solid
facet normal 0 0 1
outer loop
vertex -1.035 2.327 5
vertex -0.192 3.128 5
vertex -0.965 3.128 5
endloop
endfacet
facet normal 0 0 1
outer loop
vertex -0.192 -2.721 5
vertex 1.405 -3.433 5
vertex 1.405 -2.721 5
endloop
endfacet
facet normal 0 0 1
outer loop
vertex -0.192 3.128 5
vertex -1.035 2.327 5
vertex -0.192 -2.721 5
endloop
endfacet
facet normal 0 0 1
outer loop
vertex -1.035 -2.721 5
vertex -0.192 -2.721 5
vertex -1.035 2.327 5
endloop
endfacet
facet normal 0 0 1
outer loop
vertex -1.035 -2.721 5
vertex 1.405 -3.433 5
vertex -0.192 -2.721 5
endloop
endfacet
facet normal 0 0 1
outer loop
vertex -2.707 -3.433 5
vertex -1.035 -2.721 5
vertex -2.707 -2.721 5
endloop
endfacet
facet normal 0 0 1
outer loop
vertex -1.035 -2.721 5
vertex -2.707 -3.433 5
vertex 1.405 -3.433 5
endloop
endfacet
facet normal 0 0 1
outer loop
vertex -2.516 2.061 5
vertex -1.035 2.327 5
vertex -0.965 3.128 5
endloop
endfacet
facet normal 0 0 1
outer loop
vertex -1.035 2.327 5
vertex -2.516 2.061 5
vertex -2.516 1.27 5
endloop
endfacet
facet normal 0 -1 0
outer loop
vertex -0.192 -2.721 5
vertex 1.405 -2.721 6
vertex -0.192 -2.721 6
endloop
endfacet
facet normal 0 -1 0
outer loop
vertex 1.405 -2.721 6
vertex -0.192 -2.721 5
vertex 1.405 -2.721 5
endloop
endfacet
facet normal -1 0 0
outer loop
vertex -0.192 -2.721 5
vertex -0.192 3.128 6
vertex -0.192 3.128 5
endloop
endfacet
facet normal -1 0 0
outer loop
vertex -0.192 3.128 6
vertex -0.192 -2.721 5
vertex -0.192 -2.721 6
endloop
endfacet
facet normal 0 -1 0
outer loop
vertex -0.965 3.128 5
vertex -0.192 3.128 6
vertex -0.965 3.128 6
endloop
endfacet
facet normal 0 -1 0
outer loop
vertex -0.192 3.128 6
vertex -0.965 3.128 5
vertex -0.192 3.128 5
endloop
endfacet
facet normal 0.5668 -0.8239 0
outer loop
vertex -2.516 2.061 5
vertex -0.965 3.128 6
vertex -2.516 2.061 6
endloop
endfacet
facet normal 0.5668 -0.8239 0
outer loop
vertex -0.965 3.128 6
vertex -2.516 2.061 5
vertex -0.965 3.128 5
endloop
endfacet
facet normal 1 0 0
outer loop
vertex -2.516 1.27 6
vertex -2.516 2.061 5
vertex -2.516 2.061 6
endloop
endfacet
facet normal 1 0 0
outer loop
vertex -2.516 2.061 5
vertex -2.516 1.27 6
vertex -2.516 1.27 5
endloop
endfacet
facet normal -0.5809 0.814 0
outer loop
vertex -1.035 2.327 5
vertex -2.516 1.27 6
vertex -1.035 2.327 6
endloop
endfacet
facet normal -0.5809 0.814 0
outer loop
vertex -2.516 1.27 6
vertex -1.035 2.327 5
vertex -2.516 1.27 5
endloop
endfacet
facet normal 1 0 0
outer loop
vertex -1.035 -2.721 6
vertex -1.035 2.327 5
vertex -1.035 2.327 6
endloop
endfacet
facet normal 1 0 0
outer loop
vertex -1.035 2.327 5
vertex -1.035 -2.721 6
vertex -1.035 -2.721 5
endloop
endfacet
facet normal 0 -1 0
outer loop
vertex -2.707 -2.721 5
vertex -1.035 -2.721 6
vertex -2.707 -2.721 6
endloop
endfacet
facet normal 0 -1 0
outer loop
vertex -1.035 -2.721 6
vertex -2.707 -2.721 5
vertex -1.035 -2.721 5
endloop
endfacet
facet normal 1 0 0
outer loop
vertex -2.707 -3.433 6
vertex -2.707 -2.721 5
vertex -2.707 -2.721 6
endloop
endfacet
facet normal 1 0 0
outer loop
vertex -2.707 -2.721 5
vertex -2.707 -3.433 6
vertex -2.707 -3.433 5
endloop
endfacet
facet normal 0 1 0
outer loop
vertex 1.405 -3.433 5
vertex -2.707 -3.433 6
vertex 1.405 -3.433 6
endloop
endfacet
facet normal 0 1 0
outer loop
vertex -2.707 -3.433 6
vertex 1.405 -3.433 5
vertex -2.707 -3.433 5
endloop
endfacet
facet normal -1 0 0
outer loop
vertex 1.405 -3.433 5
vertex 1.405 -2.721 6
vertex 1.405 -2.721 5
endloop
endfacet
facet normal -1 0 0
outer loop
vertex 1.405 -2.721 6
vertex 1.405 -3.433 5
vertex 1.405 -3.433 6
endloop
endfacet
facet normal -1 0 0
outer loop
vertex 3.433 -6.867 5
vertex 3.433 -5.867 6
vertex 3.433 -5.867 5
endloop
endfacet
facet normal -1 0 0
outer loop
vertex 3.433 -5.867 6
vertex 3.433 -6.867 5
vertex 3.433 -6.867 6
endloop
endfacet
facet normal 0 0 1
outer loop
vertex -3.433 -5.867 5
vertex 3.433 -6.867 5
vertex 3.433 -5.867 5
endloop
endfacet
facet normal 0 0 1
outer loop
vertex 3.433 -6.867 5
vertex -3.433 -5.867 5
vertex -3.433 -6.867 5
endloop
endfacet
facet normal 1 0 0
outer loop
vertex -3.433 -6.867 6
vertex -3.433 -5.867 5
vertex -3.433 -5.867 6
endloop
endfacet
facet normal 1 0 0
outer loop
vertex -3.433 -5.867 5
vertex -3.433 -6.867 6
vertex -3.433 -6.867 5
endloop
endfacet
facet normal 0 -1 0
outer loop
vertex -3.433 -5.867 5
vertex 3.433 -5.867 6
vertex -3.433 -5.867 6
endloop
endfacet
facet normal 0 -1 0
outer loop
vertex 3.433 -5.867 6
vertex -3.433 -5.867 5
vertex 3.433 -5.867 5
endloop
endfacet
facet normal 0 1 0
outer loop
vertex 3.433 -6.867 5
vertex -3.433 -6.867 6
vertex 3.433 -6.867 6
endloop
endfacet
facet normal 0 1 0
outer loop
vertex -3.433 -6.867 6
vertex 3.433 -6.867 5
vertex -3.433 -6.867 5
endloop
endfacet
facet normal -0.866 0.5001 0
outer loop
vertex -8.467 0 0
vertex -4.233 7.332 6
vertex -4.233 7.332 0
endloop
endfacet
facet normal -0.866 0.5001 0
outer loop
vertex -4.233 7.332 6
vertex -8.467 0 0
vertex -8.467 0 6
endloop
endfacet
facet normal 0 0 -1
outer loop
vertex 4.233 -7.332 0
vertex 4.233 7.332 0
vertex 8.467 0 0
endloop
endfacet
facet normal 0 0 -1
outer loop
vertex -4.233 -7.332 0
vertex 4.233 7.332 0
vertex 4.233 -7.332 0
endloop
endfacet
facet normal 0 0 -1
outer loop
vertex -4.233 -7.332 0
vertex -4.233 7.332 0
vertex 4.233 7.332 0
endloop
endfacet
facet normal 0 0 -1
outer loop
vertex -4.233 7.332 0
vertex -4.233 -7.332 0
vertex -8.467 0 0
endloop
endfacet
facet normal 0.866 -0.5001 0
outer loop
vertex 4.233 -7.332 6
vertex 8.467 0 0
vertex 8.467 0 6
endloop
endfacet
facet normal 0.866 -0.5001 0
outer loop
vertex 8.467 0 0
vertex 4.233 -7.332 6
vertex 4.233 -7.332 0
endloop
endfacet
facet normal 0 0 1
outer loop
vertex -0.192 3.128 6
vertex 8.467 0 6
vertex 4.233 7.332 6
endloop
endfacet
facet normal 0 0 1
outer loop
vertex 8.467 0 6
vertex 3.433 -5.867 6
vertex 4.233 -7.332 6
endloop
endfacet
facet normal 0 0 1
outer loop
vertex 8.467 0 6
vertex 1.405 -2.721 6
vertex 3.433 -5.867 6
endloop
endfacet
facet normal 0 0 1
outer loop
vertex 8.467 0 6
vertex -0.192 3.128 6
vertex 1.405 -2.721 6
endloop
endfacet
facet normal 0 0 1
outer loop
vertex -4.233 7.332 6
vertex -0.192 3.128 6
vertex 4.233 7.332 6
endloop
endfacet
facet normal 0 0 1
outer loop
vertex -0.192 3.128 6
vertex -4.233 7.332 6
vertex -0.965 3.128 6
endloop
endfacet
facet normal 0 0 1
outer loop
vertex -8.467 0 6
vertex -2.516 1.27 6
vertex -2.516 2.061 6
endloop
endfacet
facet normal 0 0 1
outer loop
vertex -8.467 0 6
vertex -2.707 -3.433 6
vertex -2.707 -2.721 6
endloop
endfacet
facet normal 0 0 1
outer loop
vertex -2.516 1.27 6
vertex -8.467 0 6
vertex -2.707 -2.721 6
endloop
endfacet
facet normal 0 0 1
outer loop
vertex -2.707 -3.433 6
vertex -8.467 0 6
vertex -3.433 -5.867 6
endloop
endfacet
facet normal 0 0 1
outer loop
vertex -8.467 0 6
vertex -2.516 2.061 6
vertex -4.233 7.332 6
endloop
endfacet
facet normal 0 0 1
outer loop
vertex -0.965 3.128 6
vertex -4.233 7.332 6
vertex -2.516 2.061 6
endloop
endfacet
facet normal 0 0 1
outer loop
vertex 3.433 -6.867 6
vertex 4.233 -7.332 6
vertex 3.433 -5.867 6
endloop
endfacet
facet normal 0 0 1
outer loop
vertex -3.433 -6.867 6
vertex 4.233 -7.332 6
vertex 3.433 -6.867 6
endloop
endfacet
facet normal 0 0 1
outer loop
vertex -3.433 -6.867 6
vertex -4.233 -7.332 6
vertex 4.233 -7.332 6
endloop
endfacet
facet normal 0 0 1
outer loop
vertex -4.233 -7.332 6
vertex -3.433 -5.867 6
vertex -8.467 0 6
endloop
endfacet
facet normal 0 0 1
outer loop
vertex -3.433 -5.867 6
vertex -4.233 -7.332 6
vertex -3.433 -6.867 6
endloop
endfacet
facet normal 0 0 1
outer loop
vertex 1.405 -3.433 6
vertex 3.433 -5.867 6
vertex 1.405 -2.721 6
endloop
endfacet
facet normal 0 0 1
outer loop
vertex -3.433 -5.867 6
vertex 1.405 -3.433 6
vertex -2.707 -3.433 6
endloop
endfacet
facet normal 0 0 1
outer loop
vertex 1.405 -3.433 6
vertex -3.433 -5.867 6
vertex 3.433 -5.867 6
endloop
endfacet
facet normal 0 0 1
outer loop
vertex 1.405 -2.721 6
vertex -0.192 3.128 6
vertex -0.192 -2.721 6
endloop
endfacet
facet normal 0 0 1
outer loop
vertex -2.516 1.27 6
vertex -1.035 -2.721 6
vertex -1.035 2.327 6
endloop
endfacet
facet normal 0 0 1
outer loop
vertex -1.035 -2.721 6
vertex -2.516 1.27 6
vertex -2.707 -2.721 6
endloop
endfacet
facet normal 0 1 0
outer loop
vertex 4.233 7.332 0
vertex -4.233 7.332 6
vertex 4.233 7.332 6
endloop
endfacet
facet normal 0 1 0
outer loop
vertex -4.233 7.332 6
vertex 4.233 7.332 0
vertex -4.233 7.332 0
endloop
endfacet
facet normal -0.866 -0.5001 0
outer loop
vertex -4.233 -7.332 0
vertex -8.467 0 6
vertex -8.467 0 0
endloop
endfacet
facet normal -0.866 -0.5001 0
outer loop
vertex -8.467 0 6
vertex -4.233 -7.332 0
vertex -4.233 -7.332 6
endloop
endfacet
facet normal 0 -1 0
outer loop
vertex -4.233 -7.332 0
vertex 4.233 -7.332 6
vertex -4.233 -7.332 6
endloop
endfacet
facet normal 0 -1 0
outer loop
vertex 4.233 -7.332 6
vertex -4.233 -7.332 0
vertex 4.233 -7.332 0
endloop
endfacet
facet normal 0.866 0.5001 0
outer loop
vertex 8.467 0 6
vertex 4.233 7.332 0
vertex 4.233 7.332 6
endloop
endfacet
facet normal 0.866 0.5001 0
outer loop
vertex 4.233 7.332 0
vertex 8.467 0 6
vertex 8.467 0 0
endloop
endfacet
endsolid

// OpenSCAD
// file: ../library/calculate.scad
module inlay(depth)
{
    difference()
    {
        children(0);
        translate([ 0, 0, depth ]) children([1:$children - 1]);
    }
}
// file: ../library/variables.scad
// Variables

die_width = 12;
double_digit_placement = 1; // 0.7 for 8mm, 1 for 12mm

wiggle_width = 0.2;
separator = 1.6;
base_plate_sides = 5;
token_sides = 6;
slot_height = 1;

// Calculations

height = die_width / 2;

die_slot_width = die_width + wiggle_width;
die_slot_y = -1 * ((die_slot_width / 2) + separator);
die_slot_right_x = (die_slot_width / 2) + separator;
die_slot_left_x = -1 * (die_slot_width / 2) - separator;

base_plate_size = (die_slot_width * 2) + separator;
inset_width = base_plate_size - separator;
inset_depth = height - separator;

shallow_slot_height = (height - inset_depth) / 2;

token_slot_width = base_plate_size / 3;
token_width = token_slot_width - wiggle_width;
token_height = height;
token_slot_y = (die_slot_width / 2) + (separator * 2);
token_inset_height = token_height - 1;
token_doubledigit_font_size = token_width - separator;

token_poison_width = (token_width / 3);
token_poison_placement = (token_width / 3);
// file: ../library/tokens.scad
include <variables.scad>
include <calculate.scad>

module token_base()
{
    linear_extrude(token_height) circle(token_width, $fn = token_sides);
}

module token_doubledigit_number(num) 
{
    inlay(depth = token_inset_height) 
    {
        token_base();
        translate([-1 * token_doubledigit_font_size + double_digit_placement, -1 * token_doubledigit_font_size / 2, 0]) linear_extrude(token_height) text(text = num, size = token_doubledigit_font_size);
        translate([-1 * token_doubledigit_font_size / 2, -1 * token_doubledigit_font_size, 0]) cube([token_doubledigit_font_size, 1, 2]);
    }
}

module token_singledigit_number(num) 
{ 
    inlay(depth = token_inset_height) 
    {
        token_base();
        translate([-1 * (token_doubledigit_font_size / 2), -1 * token_doubledigit_font_size / 2, 0]) linear_extrude(token_height) text(text = num, size = token_doubledigit_font_size);
        translate([-1 * token_doubledigit_font_size / 2, -1 * token_doubledigit_font_size, 0]) cube([token_doubledigit_font_size, 1, 2]);
    }
}
// main file
include <../library/tokens.scad>

token_singledigit_number("1");
